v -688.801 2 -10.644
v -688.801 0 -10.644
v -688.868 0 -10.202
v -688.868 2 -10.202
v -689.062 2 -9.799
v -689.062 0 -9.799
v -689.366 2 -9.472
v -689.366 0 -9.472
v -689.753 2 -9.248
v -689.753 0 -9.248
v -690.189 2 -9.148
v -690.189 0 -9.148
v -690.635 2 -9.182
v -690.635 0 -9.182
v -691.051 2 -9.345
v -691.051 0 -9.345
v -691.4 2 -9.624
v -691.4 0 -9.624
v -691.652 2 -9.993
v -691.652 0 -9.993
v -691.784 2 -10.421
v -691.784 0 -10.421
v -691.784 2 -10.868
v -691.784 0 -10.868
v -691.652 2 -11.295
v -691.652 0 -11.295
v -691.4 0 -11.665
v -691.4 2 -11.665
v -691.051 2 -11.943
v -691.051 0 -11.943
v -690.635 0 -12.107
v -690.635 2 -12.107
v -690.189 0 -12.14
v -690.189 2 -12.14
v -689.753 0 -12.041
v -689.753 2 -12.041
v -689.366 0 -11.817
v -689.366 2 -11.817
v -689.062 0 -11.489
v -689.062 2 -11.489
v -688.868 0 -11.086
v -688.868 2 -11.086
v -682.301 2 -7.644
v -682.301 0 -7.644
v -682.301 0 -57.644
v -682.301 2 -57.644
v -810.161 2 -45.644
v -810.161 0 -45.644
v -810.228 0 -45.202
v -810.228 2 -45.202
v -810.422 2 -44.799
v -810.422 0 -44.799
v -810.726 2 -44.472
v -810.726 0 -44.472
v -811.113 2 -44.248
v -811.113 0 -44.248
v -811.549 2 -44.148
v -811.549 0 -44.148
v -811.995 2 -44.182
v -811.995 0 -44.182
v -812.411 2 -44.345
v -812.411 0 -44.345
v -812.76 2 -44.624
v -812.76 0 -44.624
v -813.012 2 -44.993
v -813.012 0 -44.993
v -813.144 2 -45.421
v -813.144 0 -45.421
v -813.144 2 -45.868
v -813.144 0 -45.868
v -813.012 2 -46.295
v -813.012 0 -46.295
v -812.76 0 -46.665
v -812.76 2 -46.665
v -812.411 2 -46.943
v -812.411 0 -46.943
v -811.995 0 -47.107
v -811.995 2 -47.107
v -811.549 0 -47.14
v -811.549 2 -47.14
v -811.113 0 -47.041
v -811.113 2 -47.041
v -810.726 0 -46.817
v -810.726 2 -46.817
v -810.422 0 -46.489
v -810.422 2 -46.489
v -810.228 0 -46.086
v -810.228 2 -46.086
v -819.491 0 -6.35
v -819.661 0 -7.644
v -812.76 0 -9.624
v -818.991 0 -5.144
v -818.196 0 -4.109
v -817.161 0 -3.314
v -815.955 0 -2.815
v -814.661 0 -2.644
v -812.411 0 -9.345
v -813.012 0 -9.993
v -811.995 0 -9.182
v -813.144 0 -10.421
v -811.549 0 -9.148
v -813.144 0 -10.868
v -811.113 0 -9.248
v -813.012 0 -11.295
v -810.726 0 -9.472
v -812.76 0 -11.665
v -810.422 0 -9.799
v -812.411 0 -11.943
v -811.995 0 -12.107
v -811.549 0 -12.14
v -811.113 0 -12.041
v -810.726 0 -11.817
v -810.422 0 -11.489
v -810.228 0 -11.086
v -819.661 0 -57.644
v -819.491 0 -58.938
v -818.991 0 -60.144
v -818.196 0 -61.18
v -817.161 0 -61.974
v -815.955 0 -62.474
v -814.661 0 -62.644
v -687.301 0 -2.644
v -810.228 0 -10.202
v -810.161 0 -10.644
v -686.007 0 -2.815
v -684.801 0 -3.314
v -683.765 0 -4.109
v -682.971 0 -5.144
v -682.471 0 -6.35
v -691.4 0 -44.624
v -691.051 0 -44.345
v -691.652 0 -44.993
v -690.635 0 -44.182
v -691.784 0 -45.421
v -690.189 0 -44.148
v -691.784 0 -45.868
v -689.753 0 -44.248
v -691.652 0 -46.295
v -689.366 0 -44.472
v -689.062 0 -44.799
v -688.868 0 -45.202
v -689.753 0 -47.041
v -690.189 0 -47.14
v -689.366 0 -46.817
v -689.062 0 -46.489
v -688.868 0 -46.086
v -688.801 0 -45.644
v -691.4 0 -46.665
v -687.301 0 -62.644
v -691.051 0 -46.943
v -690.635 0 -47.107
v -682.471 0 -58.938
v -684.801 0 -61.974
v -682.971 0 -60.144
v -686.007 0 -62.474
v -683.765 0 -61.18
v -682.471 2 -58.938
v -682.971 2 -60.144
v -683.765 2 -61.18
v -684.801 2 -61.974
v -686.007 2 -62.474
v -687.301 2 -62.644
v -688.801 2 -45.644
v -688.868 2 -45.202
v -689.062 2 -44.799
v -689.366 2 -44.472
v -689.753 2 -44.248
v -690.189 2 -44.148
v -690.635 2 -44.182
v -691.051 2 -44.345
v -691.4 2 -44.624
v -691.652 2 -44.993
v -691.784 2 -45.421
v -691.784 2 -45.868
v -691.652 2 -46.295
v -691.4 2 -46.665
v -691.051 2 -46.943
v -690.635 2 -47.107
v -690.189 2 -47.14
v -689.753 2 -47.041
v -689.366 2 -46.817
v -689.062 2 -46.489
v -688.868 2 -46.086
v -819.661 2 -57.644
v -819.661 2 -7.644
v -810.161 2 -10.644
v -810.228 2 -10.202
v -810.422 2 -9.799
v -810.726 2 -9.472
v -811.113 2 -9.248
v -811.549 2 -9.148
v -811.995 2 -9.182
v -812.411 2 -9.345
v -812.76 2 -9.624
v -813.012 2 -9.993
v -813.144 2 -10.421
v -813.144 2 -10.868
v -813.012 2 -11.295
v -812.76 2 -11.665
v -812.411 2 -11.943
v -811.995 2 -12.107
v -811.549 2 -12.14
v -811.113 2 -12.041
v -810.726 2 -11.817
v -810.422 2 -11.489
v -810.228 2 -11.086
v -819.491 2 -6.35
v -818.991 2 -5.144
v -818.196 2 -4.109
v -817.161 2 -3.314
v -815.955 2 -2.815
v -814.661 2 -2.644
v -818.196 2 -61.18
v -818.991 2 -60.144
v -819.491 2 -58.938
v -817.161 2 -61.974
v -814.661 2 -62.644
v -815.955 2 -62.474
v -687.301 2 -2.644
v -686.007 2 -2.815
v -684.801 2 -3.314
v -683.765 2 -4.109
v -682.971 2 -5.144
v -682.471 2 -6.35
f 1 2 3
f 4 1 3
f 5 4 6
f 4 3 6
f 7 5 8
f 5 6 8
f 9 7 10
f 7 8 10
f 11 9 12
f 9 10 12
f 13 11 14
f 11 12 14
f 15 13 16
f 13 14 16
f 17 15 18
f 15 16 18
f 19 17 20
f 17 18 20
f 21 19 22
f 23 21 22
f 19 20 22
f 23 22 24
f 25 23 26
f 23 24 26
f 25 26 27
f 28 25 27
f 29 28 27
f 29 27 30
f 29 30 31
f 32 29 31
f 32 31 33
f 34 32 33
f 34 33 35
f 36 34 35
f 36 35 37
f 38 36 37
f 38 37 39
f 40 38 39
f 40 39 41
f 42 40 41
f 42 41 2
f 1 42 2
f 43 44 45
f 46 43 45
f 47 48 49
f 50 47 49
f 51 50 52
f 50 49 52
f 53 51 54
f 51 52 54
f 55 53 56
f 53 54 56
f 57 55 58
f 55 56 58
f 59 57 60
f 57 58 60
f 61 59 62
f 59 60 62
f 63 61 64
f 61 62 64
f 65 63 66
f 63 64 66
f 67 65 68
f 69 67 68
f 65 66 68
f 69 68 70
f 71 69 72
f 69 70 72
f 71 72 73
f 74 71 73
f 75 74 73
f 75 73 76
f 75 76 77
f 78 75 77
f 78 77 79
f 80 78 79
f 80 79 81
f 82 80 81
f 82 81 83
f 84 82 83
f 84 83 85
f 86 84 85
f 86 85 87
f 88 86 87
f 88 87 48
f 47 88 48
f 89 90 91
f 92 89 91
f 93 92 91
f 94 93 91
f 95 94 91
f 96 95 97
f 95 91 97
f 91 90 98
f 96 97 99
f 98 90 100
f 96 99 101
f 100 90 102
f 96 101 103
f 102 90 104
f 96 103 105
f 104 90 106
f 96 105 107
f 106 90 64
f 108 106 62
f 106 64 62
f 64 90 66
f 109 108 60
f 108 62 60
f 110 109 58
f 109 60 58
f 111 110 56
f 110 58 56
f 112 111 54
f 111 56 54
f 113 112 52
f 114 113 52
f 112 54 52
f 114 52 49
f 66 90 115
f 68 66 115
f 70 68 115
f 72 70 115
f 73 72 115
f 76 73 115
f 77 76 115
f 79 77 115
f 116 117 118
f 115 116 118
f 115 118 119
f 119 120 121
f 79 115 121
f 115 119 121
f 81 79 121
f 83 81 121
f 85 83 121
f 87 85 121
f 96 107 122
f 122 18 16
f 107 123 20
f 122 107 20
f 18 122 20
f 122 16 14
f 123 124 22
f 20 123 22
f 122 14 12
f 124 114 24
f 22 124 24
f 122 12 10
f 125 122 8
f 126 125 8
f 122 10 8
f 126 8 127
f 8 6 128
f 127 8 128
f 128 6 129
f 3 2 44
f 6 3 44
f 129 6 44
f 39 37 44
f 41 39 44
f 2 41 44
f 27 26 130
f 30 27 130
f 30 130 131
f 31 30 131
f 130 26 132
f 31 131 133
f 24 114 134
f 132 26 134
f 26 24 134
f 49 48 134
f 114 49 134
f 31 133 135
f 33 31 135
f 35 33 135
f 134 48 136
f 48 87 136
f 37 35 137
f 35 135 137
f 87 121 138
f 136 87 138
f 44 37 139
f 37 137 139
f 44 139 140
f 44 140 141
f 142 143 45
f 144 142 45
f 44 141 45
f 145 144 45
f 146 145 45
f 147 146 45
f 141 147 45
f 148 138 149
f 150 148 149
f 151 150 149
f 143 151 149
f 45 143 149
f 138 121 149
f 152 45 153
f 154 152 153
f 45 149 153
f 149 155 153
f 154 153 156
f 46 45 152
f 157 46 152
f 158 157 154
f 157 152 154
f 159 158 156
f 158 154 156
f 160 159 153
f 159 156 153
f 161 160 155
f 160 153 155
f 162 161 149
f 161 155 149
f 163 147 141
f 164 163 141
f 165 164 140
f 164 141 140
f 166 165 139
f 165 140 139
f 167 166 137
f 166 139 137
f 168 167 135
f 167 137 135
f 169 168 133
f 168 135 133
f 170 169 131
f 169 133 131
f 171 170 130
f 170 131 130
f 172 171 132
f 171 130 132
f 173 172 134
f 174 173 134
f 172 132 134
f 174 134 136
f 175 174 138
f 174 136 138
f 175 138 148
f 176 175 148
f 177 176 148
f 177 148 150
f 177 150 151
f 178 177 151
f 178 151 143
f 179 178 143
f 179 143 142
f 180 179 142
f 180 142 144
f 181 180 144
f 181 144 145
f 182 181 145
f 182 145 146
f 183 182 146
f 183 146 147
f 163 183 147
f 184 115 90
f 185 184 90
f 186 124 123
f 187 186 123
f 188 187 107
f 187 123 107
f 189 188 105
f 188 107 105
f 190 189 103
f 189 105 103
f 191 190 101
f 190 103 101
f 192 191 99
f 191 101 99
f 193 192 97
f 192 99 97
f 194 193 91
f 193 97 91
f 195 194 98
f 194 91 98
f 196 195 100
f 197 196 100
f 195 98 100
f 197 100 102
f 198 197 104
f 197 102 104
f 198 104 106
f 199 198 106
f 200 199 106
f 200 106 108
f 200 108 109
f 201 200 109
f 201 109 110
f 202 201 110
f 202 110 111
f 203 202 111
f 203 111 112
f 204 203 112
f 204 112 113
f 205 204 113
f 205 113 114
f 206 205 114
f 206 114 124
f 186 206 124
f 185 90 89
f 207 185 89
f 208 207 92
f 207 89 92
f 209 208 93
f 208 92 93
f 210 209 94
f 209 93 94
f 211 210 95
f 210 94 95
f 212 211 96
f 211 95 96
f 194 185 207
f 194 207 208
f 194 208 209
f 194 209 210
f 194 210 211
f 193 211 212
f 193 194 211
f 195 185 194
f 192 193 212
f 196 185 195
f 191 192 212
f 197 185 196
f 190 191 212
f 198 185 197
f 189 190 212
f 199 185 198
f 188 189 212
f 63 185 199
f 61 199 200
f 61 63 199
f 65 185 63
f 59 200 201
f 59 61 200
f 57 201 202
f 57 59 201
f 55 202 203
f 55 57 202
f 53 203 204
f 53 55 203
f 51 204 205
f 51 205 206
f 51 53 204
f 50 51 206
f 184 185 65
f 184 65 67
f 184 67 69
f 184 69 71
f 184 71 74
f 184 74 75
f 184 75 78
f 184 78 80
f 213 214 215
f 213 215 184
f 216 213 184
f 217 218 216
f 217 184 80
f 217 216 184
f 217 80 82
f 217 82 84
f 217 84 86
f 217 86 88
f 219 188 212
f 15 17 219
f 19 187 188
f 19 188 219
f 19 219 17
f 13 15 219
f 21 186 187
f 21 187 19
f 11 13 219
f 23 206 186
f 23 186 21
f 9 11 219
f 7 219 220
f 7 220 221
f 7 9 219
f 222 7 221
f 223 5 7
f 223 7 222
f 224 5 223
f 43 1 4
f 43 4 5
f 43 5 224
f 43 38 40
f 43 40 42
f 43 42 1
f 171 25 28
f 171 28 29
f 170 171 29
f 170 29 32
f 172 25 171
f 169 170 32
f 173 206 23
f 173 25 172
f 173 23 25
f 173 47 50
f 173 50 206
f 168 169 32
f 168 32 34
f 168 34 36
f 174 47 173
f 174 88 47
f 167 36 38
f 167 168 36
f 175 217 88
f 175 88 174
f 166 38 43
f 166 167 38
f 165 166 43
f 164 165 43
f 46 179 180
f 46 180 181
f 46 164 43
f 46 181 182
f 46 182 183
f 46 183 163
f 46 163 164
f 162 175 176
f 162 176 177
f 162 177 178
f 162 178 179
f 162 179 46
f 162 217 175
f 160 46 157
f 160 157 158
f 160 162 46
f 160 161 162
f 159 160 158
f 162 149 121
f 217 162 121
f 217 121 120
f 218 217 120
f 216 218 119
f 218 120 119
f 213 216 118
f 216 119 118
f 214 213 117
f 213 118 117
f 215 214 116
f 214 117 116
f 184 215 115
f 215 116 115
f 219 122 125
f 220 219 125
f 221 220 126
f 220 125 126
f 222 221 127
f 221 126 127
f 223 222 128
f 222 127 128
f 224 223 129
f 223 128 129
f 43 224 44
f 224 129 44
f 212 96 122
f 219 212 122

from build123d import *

# Parameters (mm, degrees)
BOSS_EXTRUDE1_DEPTH = 2
SKETCH4_R           = 1.5
CUT_EXTRUDE1_DEPTH  = 3


with BuildPart() as part:
    # Sketch1 → Boss-Extrude1 (new body)
    with BuildSketch(Plane(origin=(0, 0, 0), x_dir=(1, 0, 0), z_dir=(0, 1, 0))):
        with BuildLine():
            Line((-687.300884956, 62.644247788), (-814.660884956, 62.644247788))
            ThreePointArc((-814.660884956, 62.644247788), (-818.196418862, 61.179781694), (-819.660884956, 57.644247788))
            Line((-819.660884956, 57.644247788), (-819.660884956, 7.644247788))
            ThreePointArc((-819.660884956, 7.644247788), (-818.196418862, 4.108713882), (-814.660884956, 2.644247788))
            Line((-814.660884956, 2.644247788), (-687.300884956, 2.644247788))
            ThreePointArc((-687.300884956, 2.644247788), (-683.76535105, 4.108713882), (-682.300884956, 7.644247788))
            Line((-682.300884956, 7.644247788), (-682.300884956, 57.644247788))
            ThreePointArc((-682.300884956, 57.644247788), (-683.76535105, 61.179781694), (-687.300884956, 62.644247788))
        make_face()
    extrude(amount=BOSS_EXTRUDE1_DEPTH)

    # Sketch4 → Cut-Extrude1 (cut, through all)
    with BuildSketch(Plane.XZ):
        with Locations((-811.660884956, -10.644247788)):
            Circle(SKETCH4_R)
        with Locations((-811.660884956, -45.644247788)):
            Circle(SKETCH4_R)
        with Locations((-690.300884956, -10.644247788)):
            Circle(SKETCH4_R)
        with Locations((-690.300884956, -45.644247788)):
            Circle(SKETCH4_R)
    extrude(amount=-CUT_EXTRUDE1_DEPTH, mode=Mode.SUBTRACT)


solid = part.part
